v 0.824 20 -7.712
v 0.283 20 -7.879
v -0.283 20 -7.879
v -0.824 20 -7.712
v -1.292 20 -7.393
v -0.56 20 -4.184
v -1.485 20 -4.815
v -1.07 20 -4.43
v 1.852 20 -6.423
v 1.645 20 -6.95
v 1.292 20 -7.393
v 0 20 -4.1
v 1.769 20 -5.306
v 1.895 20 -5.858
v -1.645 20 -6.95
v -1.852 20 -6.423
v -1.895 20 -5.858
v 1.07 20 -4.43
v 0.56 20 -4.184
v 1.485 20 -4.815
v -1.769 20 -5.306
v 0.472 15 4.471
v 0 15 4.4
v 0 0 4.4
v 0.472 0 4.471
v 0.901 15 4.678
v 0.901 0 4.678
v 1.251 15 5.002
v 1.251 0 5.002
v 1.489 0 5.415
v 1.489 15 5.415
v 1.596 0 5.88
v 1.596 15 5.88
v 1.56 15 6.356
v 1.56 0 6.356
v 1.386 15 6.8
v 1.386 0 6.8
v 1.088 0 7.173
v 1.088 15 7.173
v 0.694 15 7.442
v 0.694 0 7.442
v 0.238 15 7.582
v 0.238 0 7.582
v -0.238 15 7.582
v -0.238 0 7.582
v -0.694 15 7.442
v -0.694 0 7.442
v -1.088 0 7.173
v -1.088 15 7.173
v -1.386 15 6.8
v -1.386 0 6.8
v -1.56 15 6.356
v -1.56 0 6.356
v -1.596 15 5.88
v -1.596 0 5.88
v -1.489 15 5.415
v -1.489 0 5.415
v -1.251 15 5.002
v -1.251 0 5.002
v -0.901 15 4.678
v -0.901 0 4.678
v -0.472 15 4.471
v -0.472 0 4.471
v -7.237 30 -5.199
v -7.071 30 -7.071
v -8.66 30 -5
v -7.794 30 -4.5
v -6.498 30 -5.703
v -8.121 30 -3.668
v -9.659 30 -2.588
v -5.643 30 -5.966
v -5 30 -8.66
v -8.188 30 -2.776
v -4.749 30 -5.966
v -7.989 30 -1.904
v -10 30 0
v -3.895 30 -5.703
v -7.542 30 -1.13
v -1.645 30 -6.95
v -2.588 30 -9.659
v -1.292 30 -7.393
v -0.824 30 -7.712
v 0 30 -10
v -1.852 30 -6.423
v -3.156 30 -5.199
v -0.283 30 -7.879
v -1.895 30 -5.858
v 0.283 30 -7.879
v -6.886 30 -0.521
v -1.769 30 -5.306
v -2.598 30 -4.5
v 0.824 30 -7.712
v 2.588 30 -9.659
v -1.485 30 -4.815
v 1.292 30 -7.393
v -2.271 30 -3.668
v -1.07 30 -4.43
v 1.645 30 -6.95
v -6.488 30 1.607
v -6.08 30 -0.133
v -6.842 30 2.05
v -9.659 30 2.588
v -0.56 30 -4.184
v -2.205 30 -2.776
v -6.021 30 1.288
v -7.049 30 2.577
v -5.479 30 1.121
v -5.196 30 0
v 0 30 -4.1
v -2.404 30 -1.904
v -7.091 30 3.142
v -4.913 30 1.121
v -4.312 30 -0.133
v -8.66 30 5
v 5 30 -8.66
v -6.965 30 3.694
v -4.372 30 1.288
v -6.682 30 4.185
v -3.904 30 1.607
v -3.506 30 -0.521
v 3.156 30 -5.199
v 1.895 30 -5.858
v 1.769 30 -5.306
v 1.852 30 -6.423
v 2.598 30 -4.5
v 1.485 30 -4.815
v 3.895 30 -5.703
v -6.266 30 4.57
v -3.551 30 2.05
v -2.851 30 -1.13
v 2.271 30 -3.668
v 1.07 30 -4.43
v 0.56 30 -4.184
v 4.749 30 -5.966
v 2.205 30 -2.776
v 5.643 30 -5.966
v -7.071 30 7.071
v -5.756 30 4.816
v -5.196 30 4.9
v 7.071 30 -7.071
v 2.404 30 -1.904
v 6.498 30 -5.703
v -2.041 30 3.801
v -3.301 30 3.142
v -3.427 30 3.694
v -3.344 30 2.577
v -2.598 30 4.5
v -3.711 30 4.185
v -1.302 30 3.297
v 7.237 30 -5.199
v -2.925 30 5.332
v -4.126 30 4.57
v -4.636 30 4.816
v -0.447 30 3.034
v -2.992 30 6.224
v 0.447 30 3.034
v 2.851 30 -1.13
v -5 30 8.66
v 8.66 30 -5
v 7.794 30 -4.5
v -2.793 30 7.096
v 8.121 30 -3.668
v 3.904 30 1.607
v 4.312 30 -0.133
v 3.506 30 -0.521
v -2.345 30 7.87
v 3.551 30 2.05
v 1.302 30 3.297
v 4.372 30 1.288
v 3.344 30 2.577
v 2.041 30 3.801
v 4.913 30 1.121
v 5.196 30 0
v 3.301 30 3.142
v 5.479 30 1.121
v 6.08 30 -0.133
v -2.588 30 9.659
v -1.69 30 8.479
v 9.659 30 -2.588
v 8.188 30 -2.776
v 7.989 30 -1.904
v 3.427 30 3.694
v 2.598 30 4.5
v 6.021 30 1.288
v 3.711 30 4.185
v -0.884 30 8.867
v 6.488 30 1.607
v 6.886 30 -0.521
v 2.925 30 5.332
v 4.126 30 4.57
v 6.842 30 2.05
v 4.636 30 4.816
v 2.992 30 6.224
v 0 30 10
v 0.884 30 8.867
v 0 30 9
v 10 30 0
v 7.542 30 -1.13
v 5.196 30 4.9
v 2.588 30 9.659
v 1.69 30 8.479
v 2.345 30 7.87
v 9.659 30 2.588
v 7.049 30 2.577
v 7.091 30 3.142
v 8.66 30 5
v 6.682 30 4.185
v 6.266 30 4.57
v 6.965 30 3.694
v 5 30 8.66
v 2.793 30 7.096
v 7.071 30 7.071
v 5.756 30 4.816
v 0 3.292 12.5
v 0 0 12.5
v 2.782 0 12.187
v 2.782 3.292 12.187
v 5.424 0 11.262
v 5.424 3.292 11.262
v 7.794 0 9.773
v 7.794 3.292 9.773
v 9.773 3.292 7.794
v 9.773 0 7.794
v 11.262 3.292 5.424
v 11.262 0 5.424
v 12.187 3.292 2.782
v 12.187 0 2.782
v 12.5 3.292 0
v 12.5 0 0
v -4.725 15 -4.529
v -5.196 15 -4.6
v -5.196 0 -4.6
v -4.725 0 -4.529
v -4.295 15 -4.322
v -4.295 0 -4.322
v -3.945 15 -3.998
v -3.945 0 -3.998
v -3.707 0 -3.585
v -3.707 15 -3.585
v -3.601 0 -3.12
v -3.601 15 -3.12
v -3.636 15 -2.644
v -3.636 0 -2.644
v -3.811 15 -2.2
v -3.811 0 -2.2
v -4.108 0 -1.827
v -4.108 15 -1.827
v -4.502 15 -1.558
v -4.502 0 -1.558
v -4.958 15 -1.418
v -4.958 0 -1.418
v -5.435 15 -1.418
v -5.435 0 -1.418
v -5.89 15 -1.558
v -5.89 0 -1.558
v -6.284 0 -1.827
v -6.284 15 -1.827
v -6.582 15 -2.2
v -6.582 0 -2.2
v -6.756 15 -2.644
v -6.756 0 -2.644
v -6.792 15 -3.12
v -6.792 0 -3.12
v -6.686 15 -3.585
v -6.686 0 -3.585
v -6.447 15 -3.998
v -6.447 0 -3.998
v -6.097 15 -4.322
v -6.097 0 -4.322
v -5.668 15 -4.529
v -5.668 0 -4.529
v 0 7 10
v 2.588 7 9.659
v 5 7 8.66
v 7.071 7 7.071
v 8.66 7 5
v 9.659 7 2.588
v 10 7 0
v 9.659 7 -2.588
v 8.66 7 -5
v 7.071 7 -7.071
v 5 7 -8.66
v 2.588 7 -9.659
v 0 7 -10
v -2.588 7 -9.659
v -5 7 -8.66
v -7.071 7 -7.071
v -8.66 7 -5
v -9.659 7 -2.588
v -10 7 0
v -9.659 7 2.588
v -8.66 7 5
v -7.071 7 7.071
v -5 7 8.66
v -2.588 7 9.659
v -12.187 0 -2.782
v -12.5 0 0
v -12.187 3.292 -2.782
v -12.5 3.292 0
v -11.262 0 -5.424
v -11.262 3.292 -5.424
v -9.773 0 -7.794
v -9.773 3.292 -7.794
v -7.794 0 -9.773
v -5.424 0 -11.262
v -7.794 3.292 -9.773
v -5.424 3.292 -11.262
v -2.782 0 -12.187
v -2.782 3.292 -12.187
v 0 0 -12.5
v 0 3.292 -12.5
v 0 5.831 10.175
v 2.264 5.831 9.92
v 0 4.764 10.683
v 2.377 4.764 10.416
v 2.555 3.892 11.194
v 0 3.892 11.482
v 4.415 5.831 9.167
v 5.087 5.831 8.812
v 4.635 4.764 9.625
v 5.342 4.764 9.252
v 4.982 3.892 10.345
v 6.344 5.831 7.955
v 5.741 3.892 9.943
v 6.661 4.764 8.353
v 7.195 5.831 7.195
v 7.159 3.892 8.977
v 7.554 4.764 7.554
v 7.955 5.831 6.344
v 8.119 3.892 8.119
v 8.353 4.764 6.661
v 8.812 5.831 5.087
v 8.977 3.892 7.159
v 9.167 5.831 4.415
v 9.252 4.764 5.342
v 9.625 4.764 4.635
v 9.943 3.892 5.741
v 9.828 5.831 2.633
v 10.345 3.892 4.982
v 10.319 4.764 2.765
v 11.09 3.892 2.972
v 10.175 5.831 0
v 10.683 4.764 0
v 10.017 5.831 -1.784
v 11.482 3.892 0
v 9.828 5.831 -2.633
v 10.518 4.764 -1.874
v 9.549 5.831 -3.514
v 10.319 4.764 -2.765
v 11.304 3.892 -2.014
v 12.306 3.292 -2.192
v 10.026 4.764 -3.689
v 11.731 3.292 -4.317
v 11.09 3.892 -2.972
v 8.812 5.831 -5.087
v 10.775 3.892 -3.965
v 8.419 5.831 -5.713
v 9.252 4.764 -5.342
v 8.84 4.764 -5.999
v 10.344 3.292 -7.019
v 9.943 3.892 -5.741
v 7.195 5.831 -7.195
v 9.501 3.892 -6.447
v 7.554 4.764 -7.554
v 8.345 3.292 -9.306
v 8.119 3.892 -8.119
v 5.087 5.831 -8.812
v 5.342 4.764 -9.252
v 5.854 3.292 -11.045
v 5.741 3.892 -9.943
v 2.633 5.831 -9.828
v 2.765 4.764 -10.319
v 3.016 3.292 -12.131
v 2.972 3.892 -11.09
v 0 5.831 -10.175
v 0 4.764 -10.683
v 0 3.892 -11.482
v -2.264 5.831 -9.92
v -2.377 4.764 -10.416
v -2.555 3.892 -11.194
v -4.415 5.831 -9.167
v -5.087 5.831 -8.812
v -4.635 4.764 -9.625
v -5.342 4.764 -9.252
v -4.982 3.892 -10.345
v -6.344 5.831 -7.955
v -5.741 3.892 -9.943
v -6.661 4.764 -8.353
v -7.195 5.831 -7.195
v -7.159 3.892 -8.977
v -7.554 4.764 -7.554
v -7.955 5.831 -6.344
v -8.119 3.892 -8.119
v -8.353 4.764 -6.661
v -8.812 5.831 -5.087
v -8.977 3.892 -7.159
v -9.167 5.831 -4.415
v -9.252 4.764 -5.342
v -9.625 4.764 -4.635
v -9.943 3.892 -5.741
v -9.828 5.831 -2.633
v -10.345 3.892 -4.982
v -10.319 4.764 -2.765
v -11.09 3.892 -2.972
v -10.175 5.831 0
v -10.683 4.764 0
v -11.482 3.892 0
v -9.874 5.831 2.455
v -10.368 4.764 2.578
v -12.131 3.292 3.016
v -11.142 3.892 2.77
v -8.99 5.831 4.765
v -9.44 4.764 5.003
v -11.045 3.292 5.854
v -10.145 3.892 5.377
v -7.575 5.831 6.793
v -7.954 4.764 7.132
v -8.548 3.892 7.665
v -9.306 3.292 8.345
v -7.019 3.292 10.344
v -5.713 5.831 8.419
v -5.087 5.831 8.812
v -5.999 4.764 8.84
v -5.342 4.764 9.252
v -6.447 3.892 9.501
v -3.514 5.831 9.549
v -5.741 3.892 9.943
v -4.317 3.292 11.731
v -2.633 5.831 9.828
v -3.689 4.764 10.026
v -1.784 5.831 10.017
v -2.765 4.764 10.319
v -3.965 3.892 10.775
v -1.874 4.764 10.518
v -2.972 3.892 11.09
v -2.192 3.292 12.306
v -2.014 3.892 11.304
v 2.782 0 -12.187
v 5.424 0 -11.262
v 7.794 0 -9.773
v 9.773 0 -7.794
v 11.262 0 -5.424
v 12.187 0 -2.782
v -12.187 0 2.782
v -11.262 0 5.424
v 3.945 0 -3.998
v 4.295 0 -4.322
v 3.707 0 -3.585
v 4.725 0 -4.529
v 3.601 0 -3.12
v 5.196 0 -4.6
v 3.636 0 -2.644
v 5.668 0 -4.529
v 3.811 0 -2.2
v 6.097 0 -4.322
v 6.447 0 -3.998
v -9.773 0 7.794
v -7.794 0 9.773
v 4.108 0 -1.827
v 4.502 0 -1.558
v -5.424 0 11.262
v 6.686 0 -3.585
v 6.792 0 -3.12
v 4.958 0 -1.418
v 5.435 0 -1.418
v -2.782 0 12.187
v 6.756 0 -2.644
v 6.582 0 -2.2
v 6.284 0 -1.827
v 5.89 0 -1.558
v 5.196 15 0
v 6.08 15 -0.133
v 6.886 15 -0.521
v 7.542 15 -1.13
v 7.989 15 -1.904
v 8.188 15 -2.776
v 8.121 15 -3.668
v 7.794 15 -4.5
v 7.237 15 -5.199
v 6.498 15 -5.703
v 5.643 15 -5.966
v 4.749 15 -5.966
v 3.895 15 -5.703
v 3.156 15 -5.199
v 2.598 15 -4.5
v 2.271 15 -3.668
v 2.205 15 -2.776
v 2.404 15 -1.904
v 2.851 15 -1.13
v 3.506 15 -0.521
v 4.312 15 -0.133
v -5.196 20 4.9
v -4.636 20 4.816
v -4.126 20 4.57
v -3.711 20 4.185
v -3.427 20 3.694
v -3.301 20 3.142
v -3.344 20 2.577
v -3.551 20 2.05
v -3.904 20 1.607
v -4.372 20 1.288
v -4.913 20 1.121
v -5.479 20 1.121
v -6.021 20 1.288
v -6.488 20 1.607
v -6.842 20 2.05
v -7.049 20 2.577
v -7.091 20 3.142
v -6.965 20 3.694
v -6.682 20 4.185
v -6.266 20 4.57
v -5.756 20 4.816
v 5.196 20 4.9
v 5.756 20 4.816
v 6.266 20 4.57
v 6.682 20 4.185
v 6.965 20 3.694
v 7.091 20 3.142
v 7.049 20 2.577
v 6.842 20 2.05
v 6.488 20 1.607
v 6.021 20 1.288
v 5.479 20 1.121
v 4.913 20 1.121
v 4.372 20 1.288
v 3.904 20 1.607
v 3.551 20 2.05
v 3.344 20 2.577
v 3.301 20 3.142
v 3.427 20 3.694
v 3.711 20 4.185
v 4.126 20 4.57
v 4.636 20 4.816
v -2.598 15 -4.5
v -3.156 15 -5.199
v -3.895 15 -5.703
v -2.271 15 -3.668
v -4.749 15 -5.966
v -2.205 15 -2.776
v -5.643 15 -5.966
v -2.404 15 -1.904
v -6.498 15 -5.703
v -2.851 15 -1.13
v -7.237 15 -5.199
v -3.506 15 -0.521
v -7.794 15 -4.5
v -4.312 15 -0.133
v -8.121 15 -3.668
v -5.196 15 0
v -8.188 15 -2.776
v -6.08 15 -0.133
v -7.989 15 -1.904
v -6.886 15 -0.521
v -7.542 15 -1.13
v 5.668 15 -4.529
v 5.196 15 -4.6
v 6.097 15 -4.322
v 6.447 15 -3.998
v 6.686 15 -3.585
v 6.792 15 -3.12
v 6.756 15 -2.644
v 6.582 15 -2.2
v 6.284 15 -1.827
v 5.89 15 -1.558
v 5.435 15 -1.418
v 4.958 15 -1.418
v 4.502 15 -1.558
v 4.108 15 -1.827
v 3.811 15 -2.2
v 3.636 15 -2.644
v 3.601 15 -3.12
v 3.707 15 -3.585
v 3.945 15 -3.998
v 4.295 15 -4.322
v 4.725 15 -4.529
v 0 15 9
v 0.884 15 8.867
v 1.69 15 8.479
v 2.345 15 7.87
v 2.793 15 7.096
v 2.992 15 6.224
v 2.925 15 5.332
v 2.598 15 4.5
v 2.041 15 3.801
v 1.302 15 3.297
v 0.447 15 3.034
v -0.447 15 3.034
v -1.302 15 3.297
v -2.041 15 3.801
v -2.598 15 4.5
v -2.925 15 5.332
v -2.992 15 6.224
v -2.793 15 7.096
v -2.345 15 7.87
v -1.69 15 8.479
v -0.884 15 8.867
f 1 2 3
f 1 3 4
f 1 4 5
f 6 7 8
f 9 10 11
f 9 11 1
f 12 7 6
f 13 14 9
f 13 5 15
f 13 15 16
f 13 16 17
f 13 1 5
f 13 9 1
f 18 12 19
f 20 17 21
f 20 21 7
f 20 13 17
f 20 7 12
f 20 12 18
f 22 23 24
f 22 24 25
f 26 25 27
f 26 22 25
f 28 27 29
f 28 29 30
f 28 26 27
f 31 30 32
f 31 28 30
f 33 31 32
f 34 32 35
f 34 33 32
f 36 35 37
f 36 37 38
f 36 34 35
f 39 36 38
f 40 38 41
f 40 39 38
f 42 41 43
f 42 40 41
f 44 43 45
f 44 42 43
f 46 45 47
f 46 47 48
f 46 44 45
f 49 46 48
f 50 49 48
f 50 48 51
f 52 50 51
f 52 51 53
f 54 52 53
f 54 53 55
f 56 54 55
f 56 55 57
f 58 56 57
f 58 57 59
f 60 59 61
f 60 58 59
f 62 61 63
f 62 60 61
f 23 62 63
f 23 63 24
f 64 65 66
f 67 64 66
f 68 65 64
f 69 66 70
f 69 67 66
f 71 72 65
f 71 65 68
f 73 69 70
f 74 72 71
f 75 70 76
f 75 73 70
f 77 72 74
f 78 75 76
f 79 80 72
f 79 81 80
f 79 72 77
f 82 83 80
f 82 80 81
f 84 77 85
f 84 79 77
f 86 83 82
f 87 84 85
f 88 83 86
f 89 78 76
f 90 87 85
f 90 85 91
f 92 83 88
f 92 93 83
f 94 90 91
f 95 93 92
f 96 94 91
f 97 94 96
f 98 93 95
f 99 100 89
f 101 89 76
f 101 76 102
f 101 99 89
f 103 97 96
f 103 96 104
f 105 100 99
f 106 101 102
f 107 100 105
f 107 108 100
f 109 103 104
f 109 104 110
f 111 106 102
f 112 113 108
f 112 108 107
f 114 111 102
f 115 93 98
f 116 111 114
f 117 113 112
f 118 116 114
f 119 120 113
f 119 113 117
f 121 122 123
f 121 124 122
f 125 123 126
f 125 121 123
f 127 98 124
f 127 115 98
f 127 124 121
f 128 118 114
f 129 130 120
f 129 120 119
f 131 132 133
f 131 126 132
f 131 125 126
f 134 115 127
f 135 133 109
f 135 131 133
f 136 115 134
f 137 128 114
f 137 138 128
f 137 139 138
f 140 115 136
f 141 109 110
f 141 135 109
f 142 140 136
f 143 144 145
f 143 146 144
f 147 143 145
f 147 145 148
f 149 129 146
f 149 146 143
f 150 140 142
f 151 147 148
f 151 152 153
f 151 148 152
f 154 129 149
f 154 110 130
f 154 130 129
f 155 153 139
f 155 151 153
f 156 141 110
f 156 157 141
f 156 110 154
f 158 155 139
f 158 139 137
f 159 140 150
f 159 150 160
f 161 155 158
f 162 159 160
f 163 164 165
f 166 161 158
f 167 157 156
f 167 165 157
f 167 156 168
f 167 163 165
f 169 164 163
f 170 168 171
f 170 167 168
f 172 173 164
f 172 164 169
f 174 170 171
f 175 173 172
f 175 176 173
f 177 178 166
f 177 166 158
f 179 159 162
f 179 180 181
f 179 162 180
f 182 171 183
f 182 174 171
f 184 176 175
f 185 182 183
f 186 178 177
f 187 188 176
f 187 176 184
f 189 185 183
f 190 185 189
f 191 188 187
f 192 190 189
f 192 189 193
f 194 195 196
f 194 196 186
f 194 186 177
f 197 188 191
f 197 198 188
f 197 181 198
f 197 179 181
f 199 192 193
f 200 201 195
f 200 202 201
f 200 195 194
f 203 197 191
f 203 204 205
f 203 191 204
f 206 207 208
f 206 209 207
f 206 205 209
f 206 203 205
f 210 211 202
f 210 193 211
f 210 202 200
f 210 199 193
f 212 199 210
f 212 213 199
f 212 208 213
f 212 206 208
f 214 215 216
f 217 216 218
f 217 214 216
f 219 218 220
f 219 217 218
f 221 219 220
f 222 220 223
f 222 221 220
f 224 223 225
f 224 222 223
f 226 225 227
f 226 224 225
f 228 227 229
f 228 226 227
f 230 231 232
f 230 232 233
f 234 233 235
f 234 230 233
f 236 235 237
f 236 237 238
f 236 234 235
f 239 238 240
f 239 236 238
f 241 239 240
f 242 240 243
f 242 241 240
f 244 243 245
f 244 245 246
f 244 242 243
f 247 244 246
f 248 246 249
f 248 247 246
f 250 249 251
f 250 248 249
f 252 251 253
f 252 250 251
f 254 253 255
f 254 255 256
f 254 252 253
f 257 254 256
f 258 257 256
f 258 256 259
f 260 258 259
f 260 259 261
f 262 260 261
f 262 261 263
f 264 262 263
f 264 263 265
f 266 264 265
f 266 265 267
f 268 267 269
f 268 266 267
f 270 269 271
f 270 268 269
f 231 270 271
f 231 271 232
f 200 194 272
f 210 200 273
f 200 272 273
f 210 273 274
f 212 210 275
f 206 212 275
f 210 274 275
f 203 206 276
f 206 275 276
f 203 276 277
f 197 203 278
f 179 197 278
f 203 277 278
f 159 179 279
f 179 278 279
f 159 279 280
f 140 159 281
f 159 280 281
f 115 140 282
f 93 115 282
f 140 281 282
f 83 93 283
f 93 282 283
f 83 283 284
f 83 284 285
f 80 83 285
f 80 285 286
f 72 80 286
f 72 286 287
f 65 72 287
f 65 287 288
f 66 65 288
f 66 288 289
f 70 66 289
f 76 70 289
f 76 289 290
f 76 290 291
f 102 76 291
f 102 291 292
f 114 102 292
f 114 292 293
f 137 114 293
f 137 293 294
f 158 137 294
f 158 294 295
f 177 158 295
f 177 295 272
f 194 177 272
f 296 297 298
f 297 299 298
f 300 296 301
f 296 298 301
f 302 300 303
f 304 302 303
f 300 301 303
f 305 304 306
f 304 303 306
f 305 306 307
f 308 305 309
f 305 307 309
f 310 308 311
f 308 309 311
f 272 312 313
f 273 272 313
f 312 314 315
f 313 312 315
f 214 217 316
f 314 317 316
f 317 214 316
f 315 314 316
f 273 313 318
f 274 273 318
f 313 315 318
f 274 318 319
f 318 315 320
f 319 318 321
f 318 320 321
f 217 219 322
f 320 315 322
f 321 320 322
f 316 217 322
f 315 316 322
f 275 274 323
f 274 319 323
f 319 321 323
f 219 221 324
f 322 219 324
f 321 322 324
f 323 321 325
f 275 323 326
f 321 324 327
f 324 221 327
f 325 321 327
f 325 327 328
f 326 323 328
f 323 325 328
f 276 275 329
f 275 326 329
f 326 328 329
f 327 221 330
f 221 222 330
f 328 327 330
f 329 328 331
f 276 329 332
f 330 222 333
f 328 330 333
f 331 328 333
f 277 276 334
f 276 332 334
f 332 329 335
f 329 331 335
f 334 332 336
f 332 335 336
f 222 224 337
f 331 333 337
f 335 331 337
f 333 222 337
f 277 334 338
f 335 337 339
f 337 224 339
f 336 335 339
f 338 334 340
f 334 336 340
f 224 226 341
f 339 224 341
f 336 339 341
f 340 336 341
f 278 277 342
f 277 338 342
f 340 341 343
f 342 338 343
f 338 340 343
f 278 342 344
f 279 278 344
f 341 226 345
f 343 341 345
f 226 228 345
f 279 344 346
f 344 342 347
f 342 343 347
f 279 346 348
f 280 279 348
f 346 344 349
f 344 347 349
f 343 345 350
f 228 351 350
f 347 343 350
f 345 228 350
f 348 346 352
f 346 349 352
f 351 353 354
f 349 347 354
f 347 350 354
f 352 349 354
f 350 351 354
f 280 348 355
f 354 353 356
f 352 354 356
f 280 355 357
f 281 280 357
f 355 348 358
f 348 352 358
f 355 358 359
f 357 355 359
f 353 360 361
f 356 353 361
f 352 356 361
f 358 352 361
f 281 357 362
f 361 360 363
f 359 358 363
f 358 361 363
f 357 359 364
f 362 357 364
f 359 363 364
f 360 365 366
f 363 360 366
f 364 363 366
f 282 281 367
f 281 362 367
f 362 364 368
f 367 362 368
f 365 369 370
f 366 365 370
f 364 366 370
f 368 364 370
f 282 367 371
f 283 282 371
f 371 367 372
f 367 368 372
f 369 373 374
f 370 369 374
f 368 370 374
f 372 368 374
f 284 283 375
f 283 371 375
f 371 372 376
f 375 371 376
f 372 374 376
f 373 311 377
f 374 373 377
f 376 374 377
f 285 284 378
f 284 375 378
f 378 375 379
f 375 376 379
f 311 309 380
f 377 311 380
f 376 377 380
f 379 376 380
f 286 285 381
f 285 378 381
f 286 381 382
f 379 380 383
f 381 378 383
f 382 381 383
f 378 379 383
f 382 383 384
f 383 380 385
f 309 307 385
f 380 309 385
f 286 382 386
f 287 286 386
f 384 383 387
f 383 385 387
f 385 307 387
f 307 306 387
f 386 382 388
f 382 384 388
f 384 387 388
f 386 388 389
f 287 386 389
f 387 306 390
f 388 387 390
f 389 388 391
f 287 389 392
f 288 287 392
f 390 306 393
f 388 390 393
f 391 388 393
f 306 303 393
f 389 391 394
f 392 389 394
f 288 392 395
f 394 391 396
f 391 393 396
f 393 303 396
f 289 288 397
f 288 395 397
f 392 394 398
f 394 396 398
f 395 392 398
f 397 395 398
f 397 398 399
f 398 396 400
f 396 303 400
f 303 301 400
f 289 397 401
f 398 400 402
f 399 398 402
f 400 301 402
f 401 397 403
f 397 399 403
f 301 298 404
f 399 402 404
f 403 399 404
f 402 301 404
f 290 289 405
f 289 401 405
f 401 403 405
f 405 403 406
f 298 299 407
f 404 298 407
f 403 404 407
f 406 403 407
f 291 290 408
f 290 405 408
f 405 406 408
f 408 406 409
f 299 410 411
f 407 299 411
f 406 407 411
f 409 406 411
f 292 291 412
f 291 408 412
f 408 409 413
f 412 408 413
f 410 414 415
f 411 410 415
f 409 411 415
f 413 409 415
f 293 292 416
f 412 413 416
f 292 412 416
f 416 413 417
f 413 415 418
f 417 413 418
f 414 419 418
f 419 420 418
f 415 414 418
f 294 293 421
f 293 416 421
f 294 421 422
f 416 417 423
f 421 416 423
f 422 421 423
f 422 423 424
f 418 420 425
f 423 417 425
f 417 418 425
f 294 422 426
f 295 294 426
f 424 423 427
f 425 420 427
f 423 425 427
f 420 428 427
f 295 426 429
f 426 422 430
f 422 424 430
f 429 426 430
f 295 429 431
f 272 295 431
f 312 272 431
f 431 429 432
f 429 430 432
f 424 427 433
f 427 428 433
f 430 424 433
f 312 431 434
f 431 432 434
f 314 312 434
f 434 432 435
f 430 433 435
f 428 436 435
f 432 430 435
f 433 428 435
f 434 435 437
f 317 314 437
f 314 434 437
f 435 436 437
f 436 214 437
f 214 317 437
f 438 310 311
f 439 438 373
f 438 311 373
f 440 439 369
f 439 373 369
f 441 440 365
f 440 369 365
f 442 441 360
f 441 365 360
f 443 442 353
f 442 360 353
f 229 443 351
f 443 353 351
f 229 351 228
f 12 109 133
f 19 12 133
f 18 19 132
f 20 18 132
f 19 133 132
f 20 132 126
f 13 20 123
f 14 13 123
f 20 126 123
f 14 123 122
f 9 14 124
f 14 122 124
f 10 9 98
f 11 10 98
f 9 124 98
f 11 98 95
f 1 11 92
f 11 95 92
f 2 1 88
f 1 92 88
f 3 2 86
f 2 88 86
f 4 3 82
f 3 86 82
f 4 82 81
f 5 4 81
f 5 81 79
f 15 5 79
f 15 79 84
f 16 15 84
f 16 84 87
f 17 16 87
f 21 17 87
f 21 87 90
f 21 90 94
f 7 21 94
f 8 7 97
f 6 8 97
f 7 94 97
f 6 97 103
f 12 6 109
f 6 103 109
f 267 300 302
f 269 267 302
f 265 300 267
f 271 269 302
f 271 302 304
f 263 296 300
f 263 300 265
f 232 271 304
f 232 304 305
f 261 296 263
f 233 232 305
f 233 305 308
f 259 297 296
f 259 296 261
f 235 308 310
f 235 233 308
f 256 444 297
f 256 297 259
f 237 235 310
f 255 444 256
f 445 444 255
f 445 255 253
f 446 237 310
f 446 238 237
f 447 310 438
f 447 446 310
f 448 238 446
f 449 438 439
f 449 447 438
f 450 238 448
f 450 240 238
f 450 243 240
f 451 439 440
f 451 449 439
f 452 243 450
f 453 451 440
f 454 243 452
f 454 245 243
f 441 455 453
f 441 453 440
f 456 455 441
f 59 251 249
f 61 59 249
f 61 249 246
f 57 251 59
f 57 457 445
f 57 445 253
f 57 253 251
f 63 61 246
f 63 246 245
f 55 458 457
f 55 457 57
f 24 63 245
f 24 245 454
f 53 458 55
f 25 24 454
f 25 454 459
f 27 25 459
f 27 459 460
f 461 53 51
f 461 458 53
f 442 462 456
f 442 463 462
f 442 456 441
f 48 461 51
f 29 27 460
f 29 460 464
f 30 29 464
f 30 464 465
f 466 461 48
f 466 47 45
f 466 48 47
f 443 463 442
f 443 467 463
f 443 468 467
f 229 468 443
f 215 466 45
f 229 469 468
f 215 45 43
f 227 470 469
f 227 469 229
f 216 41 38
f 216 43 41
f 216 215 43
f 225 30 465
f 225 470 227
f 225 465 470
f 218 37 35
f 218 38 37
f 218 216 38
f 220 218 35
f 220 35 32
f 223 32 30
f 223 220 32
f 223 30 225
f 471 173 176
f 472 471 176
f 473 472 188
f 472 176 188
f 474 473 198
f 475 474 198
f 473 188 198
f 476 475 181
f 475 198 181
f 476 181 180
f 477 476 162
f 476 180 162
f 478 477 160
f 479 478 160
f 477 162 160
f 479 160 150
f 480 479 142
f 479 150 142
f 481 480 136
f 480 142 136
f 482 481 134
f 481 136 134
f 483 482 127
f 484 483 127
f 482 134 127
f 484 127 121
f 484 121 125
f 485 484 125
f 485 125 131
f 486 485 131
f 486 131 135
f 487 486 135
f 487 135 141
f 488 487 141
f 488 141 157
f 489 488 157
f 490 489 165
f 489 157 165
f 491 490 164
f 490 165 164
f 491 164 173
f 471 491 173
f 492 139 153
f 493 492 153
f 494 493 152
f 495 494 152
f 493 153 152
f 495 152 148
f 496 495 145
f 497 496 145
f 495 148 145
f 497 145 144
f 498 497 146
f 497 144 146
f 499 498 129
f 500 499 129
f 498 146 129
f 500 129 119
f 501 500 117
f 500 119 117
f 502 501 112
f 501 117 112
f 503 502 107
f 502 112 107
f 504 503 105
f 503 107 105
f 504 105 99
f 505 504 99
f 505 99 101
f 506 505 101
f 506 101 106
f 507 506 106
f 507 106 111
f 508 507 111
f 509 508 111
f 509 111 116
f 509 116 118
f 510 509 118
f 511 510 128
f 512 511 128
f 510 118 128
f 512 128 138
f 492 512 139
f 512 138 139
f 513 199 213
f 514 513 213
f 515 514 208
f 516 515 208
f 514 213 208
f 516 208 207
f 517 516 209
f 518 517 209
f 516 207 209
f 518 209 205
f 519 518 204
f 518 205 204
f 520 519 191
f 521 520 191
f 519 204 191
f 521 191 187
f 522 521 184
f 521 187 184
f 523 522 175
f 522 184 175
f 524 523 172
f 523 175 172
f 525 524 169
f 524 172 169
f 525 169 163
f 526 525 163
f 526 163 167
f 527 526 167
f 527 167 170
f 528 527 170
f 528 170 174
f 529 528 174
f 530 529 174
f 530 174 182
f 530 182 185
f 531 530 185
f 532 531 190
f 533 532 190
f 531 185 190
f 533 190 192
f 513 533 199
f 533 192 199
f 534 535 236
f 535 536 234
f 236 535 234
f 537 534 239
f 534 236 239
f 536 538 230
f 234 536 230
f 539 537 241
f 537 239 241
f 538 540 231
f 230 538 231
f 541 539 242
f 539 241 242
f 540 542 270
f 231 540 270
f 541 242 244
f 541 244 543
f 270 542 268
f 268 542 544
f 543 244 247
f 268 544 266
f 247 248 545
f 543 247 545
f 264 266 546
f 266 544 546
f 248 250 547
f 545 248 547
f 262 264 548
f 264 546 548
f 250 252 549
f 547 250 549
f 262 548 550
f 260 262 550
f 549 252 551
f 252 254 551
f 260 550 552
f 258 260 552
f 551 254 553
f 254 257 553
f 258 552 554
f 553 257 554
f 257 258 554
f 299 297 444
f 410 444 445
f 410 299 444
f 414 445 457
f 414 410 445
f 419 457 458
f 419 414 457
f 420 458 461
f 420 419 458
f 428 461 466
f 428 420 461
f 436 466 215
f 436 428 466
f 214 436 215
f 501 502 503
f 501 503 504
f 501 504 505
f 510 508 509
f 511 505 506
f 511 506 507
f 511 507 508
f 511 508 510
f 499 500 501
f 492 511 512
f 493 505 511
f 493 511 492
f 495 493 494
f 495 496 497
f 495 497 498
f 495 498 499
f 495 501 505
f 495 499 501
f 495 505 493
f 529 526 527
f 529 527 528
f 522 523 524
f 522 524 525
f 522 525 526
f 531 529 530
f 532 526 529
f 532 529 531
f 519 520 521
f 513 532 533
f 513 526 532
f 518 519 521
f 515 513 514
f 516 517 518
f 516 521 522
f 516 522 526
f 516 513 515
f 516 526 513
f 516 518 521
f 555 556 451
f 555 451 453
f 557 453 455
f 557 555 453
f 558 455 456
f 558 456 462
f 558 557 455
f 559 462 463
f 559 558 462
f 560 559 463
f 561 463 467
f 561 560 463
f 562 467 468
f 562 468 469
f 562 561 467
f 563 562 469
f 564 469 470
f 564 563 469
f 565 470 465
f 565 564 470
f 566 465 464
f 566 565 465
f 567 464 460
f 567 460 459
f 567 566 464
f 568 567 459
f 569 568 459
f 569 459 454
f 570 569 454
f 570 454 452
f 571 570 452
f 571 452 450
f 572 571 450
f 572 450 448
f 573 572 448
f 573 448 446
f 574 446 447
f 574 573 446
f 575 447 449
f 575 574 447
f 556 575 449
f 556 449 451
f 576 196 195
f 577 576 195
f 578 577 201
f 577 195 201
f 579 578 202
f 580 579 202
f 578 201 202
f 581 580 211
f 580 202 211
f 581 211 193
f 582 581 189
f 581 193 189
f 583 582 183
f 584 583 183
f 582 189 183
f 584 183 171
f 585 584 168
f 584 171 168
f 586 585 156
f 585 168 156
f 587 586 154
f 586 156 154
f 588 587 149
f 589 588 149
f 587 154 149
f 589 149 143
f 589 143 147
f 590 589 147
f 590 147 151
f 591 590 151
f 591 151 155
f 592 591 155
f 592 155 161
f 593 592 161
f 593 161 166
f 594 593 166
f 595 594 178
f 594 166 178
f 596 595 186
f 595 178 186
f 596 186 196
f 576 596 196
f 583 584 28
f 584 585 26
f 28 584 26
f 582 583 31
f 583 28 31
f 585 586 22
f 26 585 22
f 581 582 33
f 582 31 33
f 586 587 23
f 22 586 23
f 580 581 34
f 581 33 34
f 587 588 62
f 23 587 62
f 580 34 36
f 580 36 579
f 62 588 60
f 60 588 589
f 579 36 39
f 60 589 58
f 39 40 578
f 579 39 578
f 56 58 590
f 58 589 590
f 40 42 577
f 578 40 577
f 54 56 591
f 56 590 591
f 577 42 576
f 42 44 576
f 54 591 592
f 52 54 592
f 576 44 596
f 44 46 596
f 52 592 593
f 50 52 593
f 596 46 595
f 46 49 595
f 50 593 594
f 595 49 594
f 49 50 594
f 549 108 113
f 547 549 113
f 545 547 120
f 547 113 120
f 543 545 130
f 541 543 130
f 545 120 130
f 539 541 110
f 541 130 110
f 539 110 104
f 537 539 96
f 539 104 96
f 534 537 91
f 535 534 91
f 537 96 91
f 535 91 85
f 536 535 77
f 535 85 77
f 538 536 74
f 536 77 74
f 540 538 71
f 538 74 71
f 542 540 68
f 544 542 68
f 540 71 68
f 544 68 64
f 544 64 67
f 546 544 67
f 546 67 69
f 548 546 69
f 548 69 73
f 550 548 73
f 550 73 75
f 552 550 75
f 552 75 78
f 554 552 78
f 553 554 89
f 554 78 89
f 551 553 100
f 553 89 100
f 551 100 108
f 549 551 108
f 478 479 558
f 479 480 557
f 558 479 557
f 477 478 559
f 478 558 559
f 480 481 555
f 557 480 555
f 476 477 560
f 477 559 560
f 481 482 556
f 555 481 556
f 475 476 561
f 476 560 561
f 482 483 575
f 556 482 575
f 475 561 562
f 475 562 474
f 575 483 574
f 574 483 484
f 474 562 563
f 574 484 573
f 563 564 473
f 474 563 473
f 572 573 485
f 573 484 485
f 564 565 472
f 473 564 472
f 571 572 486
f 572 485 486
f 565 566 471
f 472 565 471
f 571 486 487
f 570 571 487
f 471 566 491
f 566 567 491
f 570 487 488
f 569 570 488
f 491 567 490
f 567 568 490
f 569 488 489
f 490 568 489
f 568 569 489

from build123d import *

# Parameters (mm, degrees)
SKETCH_1_R          = 10
EXTRUDE_1_DEPTH     = 30
SKETCH_2_R          = 1.85
CUT_EXTRUDE_1_DEPTH = 34.166247904
SKETCH_3_R          = 1.85
SKETCH_3_R_2        = 1.6
EXTRUDE_2_DEPTH     = 15
CUT_EXTRUDE_START   = -15
SKETCH_4_R          = 2.5
SKETCH_4_R_2        = 1.85
CUT_EXTRUDE_2_DEPTH = 15
EXTRUDE_START       = -15
SKETCH_5_R          = 1.85
SKETCH_5_R_2        = 1.6
EXTRUDE_3_DEPTH     = 15
SKETCH_6_R          = 2.5
CUT_EXTRUDE_4_DEPTH = 15
SKETCH_8_W          = 25
SKETCH_8_H          = 25
SKETCH_8_R          = 10
EXTRUDE_4_DEPTH     = 3
FILLET_1_R          = 4
FILLET_6_R          = 12.5
FILLET_7_R          = 12.5
FILLET_8_R          = 12.5
FILLET_9_R          = 12.5
EXTRUDE_START_2     = -25
SKETCH_9_R          = 2.5
EXTRUDE_6_DEPTH     = 25
SKETCH_10_R         = 1.9
CUT_EXTRUDE_5_DEPTH = 10
SKETCH_11_R         = 3
CUT_EXTRUDE_6_DEPTH = 15


# Some blends are built 0.0001 mm under size
with BuildPart() as part:
    # 草图1 → 凸台-拉伸1 (new body)
    with BuildSketch(Plane(origin=(0, 0, 0), x_dir=(1, 0, 0), z_dir=(0, 1, 0))):
        with Locations(Location((0, 0, 0), (0, 0, 270))):
            Circle(SKETCH_1_R)
    extrude(amount=EXTRUDE_1_DEPTH)

    # 草图2 → 切除-拉伸1 (cut, through all)
    with BuildSketch(Plane(origin=(0, 30, 0), x_dir=(1, 0, 0), z_dir=(0, 1, 0))):
        with Locations(Location((0, 6, 0), (0, 0, 270))):
            Circle(SKETCH_2_R)
        with Locations(Location((5.196152423, 3, 0), (0, 0, 270))):
            Circle(SKETCH_2_R)
        with Locations(Location((5.196152423, -3, 0), (0, 0, 270))):
            Circle(SKETCH_2_R)
        with Locations(Location((0, -6, 0), (0, 0, 270))):
            Circle(SKETCH_2_R)
        with Locations(Location((-5.196152423, -3, 0), (0, 0, 270))):
            Circle(SKETCH_2_R)
        with Locations(Location((-5.196152423, 3, 0), (0, 0, 270))):
            Circle(SKETCH_2_R)
    extrude(amount=-CUT_EXTRUDE_1_DEPTH, mode=Mode.SUBTRACT)

    # 草图3 → 凸台-拉伸2 (add)
    # profile 1 of 3: a face of its own
    with BuildSketch(Plane(origin=(0, 30, 0), x_dir=(1, 0, 0), z_dir=(0, 1, 0))):
        with Locations(Location((0, 6, 0), (0, 0, 270))):
            Circle(SKETCH_3_R)
        with Locations(Location((0, 6, 0), (0, 0, 270))):
            Circle(SKETCH_3_R_2, mode=Mode.SUBTRACT)
    # profile 2 of 3: a face of its own
    with BuildSketch(Plane(origin=(0, 30, 0), x_dir=(1, 0, 0), z_dir=(0, 1, 0))):
        with Locations(Location((-5.196152423, -3, 0), (0, 0, 270))):
            Circle(SKETCH_3_R)
        with Locations(Location((-5.196152423, -3, 0), (0, 0, 270))):
            Circle(SKETCH_3_R_2, mode=Mode.SUBTRACT)
    # profile 3 of 3: a face of its own
    with BuildSketch(Plane(origin=(0, 30, 0), x_dir=(1, 0, 0), z_dir=(0, 1, 0))):
        with Locations(Location((5.196152423, -3, 0), (0, 0, 270))):
            Circle(SKETCH_3_R)
        with Locations(Location((5.196152423, -3, 0), (0, 0, 270))):
            Circle(SKETCH_3_R_2, mode=Mode.SUBTRACT)
    extrude(amount=-EXTRUDE_2_DEPTH)

    # 草图4 → 切除-拉伸2 (cut)
    # profile 1 of 3: a face of its own
    with BuildSketch(Plane.XZ.offset(CUT_EXTRUDE_START)):
        with Locations(Location((-5.196152423, 3, 0), (0, 0, 270))):
            Circle(SKETCH_4_R)
        with Locations((-5.196152423, 3)):
            Circle(SKETCH_4_R_2, mode=Mode.SUBTRACT)
    # profile 2 of 3: a face of its own
    with BuildSketch(Plane.XZ.offset(CUT_EXTRUDE_START)):
        with Locations(Location((5.196152423, 3, 0), (0, 0, 270))):
            Circle(SKETCH_4_R)
        with Locations((5.196152423, 3)):
            Circle(SKETCH_4_R_2, mode=Mode.SUBTRACT)
    # profile 3 of 3: a face of its own
    with BuildSketch(Plane.XZ.offset(CUT_EXTRUDE_START)):
        with Locations(Location((0, -6, 0), (0, 0, 270))):
            Circle(SKETCH_4_R)
        with Locations((0, -6)):
            Circle(SKETCH_4_R_2, mode=Mode.SUBTRACT)
    extrude(amount=CUT_EXTRUDE_2_DEPTH, mode=Mode.SUBTRACT)

    # 草图5 → 凸台-拉伸3 (add)
    # profile 1 of 3: a face of its own
    with BuildSketch(Plane.XZ.offset(EXTRUDE_START)):
        with Locations(Location((0, 6, 0), (0, 0, 90))):
            Circle(SKETCH_5_R)
        with Locations(Location((0, 6, 0), (0, 0, 270))):
            Circle(SKETCH_5_R_2, mode=Mode.SUBTRACT)
    # profile 2 of 3: a face of its own
    with BuildSketch(Plane.XZ.offset(EXTRUDE_START)):
        with Locations(Location((-5.196152423, -3, 0), (0, 0, 90))):
            Circle(SKETCH_5_R)
        with Locations(Location((-5.196152423, -3, 0), (0, 0, 270))):
            Circle(SKETCH_5_R_2, mode=Mode.SUBTRACT)
    # profile 3 of 3: a face of its own
    with BuildSketch(Plane.XZ.offset(EXTRUDE_START)):
        with Locations(Location((5.196152423, -3, 0), (0, 0, 90))):
            Circle(SKETCH_5_R)
        with Locations(Location((5.196152423, -3, 0), (0, 0, 270))):
            Circle(SKETCH_5_R_2, mode=Mode.SUBTRACT)
    extrude(amount=EXTRUDE_3_DEPTH)

    # 草图6 → 切除-拉伸4 (cut)
    with BuildSketch(Plane(origin=(0, 30, 0), x_dir=(1, 0, 0), z_dir=(0, 1, 0))):
        with Locations(Location((-5.196152423, 3, 0), (0, 0, 270))):
            Circle(SKETCH_6_R)
        with Locations(Location((5.196152423, 3, 0), (0, 0, 270))):
            Circle(SKETCH_6_R)
        with Locations(Location((0, -6, 0), (0, 0, 270))):
            Circle(SKETCH_6_R)
    extrude(amount=-CUT_EXTRUDE_4_DEPTH, mode=Mode.SUBTRACT)

    # 草图8 → 凸台-拉伸4 (add)
    with BuildSketch(Plane.XZ):
        Rectangle(SKETCH_8_W, SKETCH_8_H)
        with Locations(Location((0, 0, 0), (0, 0, 270))):
            Circle(SKETCH_8_R, mode=Mode.SUBTRACT)
    extrude(amount=-EXTRUDE_4_DEPTH)

    # 圆角1
    # the kernel refuses this fillet: 4 mm, written as the material it adds along each edge
    with BuildSketch(Plane(origin=(0, 3, 0), x_dir=(0, 0, 1), z_dir=(-1, 0, 0))) as fillet_1_piece_1_section:
        with BuildLine():
            CenterArc((10 + FILLET_1_R, FILLET_1_R), FILLET_1_R, 180, 90)
            Line((10 + FILLET_1_R, 0), (10, 0))
            Line((10, 0), (10, FILLET_1_R))
        make_face()
    fillet_1_piece_1 = revolve(axis=Axis((0, 3, 0), (0, 1, 0)), mode=Mode.PRIVATE)
    fillet_1_piece_1 = split(fillet_1_piece_1, bisect_by=Plane(origin=(-12.5, 4.125745955, -11.125745955), z_dir=(1, 0, 0)), keep=Keep.TOP, mode=Mode.PRIVATE)
    fillet_1_piece_1 = split(fillet_1_piece_1, bisect_by=Plane(origin=(0, 4.125745955, 12.5), z_dir=(0, 0, -1)), keep=Keep.TOP, mode=Mode.PRIVATE)
    fillet_1_piece_1 = split(fillet_1_piece_1, bisect_by=Plane(origin=(12.5, 4.125745955, -11.125745955), z_dir=(-1, 0, 0)), keep=Keep.TOP, mode=Mode.PRIVATE)
    fillet_1_piece_1 = split(fillet_1_piece_1, bisect_by=Plane(origin=(0, 4.125745955, -12.5), z_dir=(0, 0, 1)), keep=Keep.TOP, mode=Mode.PRIVATE)
    add(fillet_1_piece_1)

    # 圆角6
    fillet_6_edges = [part.edges().sort_by_distance(p)[0] for p in [
        (12.5, 1.5, 12.5),
    ]]
    fillet(fillet_6_edges, radius=FILLET_6_R)

    # 圆角7
    fillet_7_edges = [part.edges().sort_by_distance(p)[0] for p in [
        (-12.5, 1.5, 12.5),
    ]]
    fillet(fillet_7_edges, radius=FILLET_7_R - 0.0001)  # a hair under: the kernel refuses the full size

    # 圆角8
    fillet_8_edges = [part.edges().sort_by_distance(p)[0] for p in [
        (-12.5, 1.5, -12.5),
    ]]
    fillet(fillet_8_edges, radius=FILLET_8_R)

    # 圆角9
    fillet_9_edges = [part.edges().sort_by_distance(p)[0] for p in [
        (12.5, 1.5, -12.5),
    ]]
    fillet(fillet_9_edges, radius=FILLET_9_R - 0.0001)  # a hair under: the kernel refuses the full size

    # 草图9 → 凸台-拉伸6 (add)
    with BuildSketch(Plane.XZ.offset(EXTRUDE_START_2)):
        with Locations((5.196152423, 3)):
            Circle(SKETCH_9_R)
        with Locations((-5.196152423, 3)):
            Circle(SKETCH_9_R)
        with Locations((0, -6)):
            Circle(SKETCH_9_R)
    extrude(amount=EXTRUDE_6_DEPTH)

    # 草图10 → 切除-拉伸5 (cut)
    with BuildSketch(Plane(origin=(0, 30, 0), x_dir=(1, 0, 0), z_dir=(0, 1, 0))):
        with Locations(Location((0, 6, 0), (0, 0, 270))):
            Circle(SKETCH_10_R)
        with Locations(Location((-5.196152423, -3, 0), (0, 0, 270))):
            Circle(SKETCH_10_R)
        with Locations(Location((5.196152423, -3, 0), (0, 0, 270))):
            Circle(SKETCH_10_R)
    extrude(amount=-CUT_EXTRUDE_5_DEPTH, mode=Mode.SUBTRACT)

    # 草图11 → 切除-拉伸6 (cut)
    with BuildSketch(Plane(origin=(0, 30, 0), x_dir=(1, 0, 0), z_dir=(0, 1, 0))):
        with Locations(Location((-5.196152423, 3, 0), (0, 0, 270))):
            Circle(SKETCH_11_R)
        with Locations(Location((5.196152423, 3, 0), (0, 0, 270))):
            Circle(SKETCH_11_R)
        with Locations(Location((0, -6, 0), (0, 0, 270))):
            Circle(SKETCH_11_R)
    extrude(amount=-CUT_EXTRUDE_6_DEPTH, mode=Mode.SUBTRACT)


solid = part.part
